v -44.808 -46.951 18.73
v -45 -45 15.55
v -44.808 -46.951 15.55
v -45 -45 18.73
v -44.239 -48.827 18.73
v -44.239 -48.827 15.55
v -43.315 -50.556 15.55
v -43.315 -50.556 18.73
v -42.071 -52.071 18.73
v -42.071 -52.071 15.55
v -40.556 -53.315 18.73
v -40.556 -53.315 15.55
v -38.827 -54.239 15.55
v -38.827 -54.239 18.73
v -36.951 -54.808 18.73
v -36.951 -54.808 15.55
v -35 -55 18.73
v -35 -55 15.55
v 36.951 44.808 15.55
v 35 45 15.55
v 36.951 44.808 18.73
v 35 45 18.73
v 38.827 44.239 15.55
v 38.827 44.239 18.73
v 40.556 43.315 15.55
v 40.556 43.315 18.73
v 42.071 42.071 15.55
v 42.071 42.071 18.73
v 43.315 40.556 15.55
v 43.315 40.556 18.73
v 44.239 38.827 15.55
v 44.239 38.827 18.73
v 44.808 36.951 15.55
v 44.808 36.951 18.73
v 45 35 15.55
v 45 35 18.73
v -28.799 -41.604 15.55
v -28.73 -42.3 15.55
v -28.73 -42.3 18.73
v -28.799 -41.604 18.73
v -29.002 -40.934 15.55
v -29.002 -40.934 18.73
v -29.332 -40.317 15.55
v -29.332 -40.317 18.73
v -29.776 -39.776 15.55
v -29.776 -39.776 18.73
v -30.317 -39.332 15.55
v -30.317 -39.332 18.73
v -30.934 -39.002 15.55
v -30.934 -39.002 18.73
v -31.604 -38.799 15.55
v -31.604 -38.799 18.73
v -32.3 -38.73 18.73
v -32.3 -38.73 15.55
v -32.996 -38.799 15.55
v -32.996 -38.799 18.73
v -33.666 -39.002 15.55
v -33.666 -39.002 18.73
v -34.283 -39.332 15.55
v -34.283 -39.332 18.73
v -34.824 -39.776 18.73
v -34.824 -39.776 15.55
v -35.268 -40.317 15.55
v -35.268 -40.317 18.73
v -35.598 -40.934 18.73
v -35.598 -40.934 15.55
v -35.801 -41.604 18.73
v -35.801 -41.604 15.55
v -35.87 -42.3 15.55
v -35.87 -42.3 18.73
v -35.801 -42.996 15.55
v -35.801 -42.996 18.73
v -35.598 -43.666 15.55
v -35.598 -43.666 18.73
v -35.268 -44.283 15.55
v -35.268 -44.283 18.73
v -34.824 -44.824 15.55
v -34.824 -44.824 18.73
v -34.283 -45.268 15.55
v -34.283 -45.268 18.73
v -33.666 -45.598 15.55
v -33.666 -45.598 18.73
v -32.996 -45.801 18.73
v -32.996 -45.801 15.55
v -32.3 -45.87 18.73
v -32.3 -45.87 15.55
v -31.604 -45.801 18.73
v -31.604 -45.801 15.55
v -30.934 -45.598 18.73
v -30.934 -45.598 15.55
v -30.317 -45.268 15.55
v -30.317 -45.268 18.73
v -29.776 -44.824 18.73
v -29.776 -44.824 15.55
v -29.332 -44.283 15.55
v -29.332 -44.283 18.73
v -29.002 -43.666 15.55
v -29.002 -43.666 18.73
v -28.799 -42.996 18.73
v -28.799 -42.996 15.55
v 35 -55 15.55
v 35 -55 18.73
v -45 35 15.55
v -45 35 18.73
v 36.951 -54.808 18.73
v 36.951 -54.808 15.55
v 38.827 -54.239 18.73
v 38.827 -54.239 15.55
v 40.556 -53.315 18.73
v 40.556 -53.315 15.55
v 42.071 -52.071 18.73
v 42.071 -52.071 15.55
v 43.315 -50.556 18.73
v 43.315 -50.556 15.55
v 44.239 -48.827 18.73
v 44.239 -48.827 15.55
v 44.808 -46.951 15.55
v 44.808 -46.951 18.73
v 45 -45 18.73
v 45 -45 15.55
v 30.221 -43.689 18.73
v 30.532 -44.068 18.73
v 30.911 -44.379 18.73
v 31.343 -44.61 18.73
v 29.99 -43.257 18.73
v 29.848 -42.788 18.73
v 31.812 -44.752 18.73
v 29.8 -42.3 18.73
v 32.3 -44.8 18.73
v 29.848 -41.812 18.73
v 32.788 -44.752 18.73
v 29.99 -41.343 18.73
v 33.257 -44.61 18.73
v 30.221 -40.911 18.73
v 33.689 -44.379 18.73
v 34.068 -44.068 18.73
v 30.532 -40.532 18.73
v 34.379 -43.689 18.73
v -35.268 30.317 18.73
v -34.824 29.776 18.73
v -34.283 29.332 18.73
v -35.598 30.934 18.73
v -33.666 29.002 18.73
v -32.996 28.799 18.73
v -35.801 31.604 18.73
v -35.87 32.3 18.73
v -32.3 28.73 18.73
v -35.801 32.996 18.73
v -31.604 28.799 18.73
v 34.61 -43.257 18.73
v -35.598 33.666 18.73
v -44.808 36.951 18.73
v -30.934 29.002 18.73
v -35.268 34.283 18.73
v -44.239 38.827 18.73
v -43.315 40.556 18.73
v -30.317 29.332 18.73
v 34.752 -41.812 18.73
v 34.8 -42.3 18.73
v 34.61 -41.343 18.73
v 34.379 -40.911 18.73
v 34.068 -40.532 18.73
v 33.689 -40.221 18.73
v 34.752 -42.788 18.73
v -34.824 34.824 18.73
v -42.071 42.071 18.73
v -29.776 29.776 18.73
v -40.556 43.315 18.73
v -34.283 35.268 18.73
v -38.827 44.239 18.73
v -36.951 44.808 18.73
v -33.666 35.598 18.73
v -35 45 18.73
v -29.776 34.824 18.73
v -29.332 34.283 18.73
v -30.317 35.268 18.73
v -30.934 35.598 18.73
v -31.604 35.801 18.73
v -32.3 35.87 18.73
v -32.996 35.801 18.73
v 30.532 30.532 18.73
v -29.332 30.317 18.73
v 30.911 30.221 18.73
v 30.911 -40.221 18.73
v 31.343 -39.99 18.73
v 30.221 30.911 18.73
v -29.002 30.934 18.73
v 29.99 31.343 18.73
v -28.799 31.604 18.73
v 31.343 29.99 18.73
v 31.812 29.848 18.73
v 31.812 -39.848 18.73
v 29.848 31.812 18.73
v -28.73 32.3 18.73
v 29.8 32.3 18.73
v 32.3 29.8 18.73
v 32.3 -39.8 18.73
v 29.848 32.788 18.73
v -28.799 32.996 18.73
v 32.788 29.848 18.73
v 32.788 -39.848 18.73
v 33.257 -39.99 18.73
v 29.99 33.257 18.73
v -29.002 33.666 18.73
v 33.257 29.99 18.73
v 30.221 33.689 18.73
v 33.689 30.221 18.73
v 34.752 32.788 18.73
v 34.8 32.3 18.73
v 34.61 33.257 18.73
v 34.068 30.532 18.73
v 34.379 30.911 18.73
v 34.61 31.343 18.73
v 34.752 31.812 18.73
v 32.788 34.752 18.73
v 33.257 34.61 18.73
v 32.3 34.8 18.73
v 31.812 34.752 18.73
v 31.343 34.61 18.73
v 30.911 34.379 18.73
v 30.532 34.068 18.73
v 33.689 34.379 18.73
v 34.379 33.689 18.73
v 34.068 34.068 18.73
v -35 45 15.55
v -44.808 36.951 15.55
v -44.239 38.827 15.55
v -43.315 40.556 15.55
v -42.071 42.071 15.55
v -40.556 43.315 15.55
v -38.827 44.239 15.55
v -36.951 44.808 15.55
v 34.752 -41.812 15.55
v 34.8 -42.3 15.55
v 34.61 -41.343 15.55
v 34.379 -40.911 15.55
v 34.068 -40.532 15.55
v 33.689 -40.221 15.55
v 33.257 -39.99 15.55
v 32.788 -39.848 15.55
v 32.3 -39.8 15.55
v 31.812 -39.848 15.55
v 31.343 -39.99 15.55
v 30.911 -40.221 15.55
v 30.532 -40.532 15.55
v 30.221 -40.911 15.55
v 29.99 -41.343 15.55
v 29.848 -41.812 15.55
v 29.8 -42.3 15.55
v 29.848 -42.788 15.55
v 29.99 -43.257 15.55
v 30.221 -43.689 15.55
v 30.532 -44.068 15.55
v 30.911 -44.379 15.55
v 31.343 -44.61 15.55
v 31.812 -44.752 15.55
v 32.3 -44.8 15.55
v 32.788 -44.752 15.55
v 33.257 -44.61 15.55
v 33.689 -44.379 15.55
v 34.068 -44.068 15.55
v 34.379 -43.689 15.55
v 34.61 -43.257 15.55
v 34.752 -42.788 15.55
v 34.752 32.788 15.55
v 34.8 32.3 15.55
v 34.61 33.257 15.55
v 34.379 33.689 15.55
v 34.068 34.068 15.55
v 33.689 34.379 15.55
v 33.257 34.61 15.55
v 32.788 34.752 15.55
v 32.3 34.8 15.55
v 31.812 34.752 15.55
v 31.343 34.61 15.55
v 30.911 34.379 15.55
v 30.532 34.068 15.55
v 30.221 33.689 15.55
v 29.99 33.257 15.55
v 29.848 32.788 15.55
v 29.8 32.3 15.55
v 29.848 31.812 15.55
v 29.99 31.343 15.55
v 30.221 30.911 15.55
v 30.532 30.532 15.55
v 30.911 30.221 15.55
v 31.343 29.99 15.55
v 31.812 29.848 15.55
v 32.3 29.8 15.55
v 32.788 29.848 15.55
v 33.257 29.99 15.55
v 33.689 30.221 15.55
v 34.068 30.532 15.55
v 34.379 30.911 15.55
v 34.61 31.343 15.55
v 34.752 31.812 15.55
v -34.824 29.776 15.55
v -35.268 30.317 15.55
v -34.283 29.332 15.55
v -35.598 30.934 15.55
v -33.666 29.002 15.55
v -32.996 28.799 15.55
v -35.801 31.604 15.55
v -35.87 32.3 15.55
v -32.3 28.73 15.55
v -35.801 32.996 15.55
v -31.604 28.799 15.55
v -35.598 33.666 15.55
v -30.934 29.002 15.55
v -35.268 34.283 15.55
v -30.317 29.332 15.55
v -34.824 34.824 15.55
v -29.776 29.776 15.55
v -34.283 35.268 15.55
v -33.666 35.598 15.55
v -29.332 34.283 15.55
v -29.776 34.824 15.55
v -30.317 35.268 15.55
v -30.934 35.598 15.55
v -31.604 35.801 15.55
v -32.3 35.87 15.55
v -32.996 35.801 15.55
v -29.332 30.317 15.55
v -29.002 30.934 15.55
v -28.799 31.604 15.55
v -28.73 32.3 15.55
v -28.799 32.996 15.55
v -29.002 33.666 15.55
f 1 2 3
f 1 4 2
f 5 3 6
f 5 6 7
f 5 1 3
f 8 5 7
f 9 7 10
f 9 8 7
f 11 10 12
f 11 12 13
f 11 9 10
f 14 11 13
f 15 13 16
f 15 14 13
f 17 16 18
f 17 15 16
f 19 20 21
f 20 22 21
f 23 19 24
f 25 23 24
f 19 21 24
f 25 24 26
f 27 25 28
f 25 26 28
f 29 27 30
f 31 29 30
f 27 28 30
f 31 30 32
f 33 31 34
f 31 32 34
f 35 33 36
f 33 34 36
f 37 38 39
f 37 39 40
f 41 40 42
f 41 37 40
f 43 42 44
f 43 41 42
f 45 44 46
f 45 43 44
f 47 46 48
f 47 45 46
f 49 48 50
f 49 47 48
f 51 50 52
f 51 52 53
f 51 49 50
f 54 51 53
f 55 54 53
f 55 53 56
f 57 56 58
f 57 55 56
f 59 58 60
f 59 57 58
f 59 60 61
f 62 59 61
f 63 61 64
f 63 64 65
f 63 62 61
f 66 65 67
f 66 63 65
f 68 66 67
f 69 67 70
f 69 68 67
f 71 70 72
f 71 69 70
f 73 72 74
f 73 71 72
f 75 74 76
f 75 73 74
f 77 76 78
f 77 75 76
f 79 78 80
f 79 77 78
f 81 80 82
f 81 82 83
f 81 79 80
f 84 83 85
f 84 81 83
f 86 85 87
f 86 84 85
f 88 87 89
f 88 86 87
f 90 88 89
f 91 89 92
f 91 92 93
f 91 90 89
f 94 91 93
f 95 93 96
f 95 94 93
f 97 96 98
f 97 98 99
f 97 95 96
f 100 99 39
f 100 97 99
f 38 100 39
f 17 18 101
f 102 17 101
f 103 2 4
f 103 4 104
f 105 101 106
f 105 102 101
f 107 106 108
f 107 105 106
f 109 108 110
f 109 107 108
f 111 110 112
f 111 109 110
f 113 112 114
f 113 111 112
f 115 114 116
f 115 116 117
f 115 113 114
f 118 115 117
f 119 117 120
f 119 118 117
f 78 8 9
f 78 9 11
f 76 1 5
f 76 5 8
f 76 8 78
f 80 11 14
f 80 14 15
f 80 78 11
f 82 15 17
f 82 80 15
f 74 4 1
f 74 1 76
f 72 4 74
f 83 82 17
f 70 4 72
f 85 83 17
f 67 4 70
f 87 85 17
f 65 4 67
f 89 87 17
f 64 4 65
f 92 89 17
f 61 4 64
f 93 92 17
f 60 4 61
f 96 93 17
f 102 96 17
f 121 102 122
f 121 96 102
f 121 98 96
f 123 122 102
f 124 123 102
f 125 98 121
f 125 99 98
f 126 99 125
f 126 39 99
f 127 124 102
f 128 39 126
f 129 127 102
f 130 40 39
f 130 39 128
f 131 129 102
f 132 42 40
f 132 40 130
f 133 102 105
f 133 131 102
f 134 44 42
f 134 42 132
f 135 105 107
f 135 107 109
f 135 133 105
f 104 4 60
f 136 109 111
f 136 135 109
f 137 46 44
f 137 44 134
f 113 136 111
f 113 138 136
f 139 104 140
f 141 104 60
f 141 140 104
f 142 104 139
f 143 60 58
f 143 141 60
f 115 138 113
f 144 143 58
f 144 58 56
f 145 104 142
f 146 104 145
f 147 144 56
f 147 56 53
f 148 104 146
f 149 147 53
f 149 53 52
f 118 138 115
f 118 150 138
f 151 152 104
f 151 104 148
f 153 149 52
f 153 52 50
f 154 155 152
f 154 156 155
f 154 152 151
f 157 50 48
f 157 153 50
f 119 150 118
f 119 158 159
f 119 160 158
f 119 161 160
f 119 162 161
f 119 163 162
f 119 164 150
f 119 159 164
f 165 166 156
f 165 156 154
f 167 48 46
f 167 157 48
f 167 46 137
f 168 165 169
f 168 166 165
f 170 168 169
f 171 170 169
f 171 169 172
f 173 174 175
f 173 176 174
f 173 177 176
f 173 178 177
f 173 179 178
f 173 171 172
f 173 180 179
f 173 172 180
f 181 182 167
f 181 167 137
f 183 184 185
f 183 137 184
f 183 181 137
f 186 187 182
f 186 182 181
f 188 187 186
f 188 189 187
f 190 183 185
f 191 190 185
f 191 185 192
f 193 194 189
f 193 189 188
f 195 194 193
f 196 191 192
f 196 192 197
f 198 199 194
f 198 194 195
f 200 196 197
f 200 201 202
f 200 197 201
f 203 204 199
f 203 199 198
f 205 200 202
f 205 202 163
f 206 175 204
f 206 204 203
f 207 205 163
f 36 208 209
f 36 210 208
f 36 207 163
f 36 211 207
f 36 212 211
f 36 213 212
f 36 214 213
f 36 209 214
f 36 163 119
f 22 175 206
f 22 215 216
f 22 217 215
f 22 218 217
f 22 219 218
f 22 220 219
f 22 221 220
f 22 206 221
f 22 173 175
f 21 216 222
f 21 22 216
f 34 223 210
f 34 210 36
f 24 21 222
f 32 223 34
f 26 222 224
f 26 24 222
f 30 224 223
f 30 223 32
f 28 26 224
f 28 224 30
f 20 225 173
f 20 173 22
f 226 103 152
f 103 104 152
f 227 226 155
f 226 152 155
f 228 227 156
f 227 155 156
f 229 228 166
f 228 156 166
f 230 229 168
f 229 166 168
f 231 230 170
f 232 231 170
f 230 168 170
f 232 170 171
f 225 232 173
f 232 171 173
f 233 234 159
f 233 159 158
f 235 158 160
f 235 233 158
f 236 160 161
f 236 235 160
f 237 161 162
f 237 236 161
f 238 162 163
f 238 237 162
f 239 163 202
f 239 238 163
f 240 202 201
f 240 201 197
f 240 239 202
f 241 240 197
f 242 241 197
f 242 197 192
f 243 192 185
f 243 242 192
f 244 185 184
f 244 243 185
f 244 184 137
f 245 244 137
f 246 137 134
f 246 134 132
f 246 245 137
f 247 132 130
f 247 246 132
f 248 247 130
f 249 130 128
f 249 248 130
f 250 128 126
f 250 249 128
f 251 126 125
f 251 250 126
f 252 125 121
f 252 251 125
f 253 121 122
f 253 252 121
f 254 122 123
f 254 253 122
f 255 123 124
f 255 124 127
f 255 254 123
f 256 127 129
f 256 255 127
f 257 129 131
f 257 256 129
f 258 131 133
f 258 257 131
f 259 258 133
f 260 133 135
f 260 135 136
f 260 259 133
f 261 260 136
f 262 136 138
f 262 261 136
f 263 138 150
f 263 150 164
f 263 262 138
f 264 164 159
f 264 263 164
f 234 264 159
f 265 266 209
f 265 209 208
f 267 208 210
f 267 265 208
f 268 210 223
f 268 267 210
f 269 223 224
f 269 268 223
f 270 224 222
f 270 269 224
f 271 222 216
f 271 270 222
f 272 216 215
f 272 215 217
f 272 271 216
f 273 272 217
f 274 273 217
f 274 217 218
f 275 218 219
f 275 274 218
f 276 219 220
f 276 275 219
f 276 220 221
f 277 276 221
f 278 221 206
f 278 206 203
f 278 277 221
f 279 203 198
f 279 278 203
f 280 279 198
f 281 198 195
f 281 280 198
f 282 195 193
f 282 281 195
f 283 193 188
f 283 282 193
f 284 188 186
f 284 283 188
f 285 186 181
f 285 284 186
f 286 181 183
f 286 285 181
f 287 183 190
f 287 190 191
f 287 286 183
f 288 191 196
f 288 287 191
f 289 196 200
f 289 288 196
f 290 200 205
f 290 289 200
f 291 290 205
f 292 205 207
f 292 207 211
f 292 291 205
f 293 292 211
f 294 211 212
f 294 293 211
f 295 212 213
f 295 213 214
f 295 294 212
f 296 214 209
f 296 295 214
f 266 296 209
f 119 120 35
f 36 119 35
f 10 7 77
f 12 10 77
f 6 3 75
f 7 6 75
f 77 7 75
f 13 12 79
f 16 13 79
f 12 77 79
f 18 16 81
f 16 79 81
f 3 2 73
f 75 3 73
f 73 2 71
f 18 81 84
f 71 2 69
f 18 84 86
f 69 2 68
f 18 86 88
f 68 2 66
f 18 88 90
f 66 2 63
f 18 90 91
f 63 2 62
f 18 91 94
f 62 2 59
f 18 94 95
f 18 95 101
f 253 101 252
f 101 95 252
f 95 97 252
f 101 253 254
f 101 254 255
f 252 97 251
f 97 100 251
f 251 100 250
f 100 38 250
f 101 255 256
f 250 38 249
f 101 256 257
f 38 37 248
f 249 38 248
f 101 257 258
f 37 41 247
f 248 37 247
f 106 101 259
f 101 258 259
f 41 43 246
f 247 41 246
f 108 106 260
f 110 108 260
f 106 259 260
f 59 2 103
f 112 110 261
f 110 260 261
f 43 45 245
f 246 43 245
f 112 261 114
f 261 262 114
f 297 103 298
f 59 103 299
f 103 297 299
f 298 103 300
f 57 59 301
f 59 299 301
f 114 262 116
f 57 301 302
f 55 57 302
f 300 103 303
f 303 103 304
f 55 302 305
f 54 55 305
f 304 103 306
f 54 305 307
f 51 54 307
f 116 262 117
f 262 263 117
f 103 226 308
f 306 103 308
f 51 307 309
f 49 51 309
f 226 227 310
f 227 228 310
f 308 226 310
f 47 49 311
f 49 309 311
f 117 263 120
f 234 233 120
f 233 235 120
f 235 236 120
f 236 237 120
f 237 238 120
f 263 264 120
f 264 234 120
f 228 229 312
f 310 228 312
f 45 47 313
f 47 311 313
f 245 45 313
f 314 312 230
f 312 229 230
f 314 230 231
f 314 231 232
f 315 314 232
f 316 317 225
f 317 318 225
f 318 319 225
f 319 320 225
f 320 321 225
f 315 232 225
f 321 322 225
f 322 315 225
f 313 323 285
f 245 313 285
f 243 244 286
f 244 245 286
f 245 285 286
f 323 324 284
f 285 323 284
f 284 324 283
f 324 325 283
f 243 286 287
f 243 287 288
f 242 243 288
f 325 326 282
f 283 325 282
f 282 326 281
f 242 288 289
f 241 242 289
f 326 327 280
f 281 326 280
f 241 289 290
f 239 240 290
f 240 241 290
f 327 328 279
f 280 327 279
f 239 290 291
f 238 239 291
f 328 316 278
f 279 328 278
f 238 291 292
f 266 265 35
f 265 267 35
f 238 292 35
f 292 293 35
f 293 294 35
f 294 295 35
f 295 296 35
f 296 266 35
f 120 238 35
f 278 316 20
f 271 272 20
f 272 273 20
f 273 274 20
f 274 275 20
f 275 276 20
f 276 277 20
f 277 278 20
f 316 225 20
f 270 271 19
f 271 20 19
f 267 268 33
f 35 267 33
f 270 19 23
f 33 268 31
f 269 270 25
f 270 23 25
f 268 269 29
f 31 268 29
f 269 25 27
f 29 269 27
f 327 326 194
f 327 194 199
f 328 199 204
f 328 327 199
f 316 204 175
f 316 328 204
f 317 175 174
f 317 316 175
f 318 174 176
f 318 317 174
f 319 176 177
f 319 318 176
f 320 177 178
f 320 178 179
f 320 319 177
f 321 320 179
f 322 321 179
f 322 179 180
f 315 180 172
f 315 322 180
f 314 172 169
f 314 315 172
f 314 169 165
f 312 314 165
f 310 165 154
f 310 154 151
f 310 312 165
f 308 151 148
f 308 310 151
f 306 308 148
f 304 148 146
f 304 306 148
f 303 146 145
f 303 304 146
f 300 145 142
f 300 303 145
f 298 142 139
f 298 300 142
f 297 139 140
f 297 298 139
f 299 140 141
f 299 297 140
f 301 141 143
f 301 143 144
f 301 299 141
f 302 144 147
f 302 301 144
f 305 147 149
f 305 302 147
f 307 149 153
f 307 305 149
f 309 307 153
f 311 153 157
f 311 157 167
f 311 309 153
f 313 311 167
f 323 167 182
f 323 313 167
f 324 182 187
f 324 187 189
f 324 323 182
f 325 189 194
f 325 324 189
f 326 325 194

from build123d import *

# Parameters (mm, degrees)
BOSS_EXTRUDE1_START = 15.549813
SKETCH1_W           = 90
SKETCH1_H           = 100
SKETCH1_R           = 2.5
SKETCH1_R_2         = 3.57
BOSS_EXTRUDE1_DEPTH = 3.18
FILLET1_R           = 10


with BuildPart() as part:
    # Sketch1 → Boss-Extrude1 (new body)
    with BuildSketch(Plane.XY.offset(BOSS_EXTRUDE1_START)):
        with Locations((0, -5)):
            Rectangle(SKETCH1_W, SKETCH1_H)
        with Locations((32.3, -42.3)):
            Circle(SKETCH1_R, mode=Mode.SUBTRACT)
        with Locations((-32.3, -42.3)):
            Circle(SKETCH1_R_2, mode=Mode.SUBTRACT)
        with Locations((-32.3, 32.3)):
            Circle(SKETCH1_R_2, mode=Mode.SUBTRACT)
        with Locations((32.3, 32.3)):
            Circle(SKETCH1_R, mode=Mode.SUBTRACT)
    extrude(amount=BOSS_EXTRUDE1_DEPTH)

    # Fillet1
    fillet1_edges = [part.edges().sort_by_distance(p)[0] for p in [
        (-45, 45, 17.139813),
        (45, 45, 17.139813),
        (45, -55, 17.139813),
        (-45, -55, 17.139813),
    ]]
    fillet(fillet1_edges, radius=FILLET1_R)


solid = part.part
